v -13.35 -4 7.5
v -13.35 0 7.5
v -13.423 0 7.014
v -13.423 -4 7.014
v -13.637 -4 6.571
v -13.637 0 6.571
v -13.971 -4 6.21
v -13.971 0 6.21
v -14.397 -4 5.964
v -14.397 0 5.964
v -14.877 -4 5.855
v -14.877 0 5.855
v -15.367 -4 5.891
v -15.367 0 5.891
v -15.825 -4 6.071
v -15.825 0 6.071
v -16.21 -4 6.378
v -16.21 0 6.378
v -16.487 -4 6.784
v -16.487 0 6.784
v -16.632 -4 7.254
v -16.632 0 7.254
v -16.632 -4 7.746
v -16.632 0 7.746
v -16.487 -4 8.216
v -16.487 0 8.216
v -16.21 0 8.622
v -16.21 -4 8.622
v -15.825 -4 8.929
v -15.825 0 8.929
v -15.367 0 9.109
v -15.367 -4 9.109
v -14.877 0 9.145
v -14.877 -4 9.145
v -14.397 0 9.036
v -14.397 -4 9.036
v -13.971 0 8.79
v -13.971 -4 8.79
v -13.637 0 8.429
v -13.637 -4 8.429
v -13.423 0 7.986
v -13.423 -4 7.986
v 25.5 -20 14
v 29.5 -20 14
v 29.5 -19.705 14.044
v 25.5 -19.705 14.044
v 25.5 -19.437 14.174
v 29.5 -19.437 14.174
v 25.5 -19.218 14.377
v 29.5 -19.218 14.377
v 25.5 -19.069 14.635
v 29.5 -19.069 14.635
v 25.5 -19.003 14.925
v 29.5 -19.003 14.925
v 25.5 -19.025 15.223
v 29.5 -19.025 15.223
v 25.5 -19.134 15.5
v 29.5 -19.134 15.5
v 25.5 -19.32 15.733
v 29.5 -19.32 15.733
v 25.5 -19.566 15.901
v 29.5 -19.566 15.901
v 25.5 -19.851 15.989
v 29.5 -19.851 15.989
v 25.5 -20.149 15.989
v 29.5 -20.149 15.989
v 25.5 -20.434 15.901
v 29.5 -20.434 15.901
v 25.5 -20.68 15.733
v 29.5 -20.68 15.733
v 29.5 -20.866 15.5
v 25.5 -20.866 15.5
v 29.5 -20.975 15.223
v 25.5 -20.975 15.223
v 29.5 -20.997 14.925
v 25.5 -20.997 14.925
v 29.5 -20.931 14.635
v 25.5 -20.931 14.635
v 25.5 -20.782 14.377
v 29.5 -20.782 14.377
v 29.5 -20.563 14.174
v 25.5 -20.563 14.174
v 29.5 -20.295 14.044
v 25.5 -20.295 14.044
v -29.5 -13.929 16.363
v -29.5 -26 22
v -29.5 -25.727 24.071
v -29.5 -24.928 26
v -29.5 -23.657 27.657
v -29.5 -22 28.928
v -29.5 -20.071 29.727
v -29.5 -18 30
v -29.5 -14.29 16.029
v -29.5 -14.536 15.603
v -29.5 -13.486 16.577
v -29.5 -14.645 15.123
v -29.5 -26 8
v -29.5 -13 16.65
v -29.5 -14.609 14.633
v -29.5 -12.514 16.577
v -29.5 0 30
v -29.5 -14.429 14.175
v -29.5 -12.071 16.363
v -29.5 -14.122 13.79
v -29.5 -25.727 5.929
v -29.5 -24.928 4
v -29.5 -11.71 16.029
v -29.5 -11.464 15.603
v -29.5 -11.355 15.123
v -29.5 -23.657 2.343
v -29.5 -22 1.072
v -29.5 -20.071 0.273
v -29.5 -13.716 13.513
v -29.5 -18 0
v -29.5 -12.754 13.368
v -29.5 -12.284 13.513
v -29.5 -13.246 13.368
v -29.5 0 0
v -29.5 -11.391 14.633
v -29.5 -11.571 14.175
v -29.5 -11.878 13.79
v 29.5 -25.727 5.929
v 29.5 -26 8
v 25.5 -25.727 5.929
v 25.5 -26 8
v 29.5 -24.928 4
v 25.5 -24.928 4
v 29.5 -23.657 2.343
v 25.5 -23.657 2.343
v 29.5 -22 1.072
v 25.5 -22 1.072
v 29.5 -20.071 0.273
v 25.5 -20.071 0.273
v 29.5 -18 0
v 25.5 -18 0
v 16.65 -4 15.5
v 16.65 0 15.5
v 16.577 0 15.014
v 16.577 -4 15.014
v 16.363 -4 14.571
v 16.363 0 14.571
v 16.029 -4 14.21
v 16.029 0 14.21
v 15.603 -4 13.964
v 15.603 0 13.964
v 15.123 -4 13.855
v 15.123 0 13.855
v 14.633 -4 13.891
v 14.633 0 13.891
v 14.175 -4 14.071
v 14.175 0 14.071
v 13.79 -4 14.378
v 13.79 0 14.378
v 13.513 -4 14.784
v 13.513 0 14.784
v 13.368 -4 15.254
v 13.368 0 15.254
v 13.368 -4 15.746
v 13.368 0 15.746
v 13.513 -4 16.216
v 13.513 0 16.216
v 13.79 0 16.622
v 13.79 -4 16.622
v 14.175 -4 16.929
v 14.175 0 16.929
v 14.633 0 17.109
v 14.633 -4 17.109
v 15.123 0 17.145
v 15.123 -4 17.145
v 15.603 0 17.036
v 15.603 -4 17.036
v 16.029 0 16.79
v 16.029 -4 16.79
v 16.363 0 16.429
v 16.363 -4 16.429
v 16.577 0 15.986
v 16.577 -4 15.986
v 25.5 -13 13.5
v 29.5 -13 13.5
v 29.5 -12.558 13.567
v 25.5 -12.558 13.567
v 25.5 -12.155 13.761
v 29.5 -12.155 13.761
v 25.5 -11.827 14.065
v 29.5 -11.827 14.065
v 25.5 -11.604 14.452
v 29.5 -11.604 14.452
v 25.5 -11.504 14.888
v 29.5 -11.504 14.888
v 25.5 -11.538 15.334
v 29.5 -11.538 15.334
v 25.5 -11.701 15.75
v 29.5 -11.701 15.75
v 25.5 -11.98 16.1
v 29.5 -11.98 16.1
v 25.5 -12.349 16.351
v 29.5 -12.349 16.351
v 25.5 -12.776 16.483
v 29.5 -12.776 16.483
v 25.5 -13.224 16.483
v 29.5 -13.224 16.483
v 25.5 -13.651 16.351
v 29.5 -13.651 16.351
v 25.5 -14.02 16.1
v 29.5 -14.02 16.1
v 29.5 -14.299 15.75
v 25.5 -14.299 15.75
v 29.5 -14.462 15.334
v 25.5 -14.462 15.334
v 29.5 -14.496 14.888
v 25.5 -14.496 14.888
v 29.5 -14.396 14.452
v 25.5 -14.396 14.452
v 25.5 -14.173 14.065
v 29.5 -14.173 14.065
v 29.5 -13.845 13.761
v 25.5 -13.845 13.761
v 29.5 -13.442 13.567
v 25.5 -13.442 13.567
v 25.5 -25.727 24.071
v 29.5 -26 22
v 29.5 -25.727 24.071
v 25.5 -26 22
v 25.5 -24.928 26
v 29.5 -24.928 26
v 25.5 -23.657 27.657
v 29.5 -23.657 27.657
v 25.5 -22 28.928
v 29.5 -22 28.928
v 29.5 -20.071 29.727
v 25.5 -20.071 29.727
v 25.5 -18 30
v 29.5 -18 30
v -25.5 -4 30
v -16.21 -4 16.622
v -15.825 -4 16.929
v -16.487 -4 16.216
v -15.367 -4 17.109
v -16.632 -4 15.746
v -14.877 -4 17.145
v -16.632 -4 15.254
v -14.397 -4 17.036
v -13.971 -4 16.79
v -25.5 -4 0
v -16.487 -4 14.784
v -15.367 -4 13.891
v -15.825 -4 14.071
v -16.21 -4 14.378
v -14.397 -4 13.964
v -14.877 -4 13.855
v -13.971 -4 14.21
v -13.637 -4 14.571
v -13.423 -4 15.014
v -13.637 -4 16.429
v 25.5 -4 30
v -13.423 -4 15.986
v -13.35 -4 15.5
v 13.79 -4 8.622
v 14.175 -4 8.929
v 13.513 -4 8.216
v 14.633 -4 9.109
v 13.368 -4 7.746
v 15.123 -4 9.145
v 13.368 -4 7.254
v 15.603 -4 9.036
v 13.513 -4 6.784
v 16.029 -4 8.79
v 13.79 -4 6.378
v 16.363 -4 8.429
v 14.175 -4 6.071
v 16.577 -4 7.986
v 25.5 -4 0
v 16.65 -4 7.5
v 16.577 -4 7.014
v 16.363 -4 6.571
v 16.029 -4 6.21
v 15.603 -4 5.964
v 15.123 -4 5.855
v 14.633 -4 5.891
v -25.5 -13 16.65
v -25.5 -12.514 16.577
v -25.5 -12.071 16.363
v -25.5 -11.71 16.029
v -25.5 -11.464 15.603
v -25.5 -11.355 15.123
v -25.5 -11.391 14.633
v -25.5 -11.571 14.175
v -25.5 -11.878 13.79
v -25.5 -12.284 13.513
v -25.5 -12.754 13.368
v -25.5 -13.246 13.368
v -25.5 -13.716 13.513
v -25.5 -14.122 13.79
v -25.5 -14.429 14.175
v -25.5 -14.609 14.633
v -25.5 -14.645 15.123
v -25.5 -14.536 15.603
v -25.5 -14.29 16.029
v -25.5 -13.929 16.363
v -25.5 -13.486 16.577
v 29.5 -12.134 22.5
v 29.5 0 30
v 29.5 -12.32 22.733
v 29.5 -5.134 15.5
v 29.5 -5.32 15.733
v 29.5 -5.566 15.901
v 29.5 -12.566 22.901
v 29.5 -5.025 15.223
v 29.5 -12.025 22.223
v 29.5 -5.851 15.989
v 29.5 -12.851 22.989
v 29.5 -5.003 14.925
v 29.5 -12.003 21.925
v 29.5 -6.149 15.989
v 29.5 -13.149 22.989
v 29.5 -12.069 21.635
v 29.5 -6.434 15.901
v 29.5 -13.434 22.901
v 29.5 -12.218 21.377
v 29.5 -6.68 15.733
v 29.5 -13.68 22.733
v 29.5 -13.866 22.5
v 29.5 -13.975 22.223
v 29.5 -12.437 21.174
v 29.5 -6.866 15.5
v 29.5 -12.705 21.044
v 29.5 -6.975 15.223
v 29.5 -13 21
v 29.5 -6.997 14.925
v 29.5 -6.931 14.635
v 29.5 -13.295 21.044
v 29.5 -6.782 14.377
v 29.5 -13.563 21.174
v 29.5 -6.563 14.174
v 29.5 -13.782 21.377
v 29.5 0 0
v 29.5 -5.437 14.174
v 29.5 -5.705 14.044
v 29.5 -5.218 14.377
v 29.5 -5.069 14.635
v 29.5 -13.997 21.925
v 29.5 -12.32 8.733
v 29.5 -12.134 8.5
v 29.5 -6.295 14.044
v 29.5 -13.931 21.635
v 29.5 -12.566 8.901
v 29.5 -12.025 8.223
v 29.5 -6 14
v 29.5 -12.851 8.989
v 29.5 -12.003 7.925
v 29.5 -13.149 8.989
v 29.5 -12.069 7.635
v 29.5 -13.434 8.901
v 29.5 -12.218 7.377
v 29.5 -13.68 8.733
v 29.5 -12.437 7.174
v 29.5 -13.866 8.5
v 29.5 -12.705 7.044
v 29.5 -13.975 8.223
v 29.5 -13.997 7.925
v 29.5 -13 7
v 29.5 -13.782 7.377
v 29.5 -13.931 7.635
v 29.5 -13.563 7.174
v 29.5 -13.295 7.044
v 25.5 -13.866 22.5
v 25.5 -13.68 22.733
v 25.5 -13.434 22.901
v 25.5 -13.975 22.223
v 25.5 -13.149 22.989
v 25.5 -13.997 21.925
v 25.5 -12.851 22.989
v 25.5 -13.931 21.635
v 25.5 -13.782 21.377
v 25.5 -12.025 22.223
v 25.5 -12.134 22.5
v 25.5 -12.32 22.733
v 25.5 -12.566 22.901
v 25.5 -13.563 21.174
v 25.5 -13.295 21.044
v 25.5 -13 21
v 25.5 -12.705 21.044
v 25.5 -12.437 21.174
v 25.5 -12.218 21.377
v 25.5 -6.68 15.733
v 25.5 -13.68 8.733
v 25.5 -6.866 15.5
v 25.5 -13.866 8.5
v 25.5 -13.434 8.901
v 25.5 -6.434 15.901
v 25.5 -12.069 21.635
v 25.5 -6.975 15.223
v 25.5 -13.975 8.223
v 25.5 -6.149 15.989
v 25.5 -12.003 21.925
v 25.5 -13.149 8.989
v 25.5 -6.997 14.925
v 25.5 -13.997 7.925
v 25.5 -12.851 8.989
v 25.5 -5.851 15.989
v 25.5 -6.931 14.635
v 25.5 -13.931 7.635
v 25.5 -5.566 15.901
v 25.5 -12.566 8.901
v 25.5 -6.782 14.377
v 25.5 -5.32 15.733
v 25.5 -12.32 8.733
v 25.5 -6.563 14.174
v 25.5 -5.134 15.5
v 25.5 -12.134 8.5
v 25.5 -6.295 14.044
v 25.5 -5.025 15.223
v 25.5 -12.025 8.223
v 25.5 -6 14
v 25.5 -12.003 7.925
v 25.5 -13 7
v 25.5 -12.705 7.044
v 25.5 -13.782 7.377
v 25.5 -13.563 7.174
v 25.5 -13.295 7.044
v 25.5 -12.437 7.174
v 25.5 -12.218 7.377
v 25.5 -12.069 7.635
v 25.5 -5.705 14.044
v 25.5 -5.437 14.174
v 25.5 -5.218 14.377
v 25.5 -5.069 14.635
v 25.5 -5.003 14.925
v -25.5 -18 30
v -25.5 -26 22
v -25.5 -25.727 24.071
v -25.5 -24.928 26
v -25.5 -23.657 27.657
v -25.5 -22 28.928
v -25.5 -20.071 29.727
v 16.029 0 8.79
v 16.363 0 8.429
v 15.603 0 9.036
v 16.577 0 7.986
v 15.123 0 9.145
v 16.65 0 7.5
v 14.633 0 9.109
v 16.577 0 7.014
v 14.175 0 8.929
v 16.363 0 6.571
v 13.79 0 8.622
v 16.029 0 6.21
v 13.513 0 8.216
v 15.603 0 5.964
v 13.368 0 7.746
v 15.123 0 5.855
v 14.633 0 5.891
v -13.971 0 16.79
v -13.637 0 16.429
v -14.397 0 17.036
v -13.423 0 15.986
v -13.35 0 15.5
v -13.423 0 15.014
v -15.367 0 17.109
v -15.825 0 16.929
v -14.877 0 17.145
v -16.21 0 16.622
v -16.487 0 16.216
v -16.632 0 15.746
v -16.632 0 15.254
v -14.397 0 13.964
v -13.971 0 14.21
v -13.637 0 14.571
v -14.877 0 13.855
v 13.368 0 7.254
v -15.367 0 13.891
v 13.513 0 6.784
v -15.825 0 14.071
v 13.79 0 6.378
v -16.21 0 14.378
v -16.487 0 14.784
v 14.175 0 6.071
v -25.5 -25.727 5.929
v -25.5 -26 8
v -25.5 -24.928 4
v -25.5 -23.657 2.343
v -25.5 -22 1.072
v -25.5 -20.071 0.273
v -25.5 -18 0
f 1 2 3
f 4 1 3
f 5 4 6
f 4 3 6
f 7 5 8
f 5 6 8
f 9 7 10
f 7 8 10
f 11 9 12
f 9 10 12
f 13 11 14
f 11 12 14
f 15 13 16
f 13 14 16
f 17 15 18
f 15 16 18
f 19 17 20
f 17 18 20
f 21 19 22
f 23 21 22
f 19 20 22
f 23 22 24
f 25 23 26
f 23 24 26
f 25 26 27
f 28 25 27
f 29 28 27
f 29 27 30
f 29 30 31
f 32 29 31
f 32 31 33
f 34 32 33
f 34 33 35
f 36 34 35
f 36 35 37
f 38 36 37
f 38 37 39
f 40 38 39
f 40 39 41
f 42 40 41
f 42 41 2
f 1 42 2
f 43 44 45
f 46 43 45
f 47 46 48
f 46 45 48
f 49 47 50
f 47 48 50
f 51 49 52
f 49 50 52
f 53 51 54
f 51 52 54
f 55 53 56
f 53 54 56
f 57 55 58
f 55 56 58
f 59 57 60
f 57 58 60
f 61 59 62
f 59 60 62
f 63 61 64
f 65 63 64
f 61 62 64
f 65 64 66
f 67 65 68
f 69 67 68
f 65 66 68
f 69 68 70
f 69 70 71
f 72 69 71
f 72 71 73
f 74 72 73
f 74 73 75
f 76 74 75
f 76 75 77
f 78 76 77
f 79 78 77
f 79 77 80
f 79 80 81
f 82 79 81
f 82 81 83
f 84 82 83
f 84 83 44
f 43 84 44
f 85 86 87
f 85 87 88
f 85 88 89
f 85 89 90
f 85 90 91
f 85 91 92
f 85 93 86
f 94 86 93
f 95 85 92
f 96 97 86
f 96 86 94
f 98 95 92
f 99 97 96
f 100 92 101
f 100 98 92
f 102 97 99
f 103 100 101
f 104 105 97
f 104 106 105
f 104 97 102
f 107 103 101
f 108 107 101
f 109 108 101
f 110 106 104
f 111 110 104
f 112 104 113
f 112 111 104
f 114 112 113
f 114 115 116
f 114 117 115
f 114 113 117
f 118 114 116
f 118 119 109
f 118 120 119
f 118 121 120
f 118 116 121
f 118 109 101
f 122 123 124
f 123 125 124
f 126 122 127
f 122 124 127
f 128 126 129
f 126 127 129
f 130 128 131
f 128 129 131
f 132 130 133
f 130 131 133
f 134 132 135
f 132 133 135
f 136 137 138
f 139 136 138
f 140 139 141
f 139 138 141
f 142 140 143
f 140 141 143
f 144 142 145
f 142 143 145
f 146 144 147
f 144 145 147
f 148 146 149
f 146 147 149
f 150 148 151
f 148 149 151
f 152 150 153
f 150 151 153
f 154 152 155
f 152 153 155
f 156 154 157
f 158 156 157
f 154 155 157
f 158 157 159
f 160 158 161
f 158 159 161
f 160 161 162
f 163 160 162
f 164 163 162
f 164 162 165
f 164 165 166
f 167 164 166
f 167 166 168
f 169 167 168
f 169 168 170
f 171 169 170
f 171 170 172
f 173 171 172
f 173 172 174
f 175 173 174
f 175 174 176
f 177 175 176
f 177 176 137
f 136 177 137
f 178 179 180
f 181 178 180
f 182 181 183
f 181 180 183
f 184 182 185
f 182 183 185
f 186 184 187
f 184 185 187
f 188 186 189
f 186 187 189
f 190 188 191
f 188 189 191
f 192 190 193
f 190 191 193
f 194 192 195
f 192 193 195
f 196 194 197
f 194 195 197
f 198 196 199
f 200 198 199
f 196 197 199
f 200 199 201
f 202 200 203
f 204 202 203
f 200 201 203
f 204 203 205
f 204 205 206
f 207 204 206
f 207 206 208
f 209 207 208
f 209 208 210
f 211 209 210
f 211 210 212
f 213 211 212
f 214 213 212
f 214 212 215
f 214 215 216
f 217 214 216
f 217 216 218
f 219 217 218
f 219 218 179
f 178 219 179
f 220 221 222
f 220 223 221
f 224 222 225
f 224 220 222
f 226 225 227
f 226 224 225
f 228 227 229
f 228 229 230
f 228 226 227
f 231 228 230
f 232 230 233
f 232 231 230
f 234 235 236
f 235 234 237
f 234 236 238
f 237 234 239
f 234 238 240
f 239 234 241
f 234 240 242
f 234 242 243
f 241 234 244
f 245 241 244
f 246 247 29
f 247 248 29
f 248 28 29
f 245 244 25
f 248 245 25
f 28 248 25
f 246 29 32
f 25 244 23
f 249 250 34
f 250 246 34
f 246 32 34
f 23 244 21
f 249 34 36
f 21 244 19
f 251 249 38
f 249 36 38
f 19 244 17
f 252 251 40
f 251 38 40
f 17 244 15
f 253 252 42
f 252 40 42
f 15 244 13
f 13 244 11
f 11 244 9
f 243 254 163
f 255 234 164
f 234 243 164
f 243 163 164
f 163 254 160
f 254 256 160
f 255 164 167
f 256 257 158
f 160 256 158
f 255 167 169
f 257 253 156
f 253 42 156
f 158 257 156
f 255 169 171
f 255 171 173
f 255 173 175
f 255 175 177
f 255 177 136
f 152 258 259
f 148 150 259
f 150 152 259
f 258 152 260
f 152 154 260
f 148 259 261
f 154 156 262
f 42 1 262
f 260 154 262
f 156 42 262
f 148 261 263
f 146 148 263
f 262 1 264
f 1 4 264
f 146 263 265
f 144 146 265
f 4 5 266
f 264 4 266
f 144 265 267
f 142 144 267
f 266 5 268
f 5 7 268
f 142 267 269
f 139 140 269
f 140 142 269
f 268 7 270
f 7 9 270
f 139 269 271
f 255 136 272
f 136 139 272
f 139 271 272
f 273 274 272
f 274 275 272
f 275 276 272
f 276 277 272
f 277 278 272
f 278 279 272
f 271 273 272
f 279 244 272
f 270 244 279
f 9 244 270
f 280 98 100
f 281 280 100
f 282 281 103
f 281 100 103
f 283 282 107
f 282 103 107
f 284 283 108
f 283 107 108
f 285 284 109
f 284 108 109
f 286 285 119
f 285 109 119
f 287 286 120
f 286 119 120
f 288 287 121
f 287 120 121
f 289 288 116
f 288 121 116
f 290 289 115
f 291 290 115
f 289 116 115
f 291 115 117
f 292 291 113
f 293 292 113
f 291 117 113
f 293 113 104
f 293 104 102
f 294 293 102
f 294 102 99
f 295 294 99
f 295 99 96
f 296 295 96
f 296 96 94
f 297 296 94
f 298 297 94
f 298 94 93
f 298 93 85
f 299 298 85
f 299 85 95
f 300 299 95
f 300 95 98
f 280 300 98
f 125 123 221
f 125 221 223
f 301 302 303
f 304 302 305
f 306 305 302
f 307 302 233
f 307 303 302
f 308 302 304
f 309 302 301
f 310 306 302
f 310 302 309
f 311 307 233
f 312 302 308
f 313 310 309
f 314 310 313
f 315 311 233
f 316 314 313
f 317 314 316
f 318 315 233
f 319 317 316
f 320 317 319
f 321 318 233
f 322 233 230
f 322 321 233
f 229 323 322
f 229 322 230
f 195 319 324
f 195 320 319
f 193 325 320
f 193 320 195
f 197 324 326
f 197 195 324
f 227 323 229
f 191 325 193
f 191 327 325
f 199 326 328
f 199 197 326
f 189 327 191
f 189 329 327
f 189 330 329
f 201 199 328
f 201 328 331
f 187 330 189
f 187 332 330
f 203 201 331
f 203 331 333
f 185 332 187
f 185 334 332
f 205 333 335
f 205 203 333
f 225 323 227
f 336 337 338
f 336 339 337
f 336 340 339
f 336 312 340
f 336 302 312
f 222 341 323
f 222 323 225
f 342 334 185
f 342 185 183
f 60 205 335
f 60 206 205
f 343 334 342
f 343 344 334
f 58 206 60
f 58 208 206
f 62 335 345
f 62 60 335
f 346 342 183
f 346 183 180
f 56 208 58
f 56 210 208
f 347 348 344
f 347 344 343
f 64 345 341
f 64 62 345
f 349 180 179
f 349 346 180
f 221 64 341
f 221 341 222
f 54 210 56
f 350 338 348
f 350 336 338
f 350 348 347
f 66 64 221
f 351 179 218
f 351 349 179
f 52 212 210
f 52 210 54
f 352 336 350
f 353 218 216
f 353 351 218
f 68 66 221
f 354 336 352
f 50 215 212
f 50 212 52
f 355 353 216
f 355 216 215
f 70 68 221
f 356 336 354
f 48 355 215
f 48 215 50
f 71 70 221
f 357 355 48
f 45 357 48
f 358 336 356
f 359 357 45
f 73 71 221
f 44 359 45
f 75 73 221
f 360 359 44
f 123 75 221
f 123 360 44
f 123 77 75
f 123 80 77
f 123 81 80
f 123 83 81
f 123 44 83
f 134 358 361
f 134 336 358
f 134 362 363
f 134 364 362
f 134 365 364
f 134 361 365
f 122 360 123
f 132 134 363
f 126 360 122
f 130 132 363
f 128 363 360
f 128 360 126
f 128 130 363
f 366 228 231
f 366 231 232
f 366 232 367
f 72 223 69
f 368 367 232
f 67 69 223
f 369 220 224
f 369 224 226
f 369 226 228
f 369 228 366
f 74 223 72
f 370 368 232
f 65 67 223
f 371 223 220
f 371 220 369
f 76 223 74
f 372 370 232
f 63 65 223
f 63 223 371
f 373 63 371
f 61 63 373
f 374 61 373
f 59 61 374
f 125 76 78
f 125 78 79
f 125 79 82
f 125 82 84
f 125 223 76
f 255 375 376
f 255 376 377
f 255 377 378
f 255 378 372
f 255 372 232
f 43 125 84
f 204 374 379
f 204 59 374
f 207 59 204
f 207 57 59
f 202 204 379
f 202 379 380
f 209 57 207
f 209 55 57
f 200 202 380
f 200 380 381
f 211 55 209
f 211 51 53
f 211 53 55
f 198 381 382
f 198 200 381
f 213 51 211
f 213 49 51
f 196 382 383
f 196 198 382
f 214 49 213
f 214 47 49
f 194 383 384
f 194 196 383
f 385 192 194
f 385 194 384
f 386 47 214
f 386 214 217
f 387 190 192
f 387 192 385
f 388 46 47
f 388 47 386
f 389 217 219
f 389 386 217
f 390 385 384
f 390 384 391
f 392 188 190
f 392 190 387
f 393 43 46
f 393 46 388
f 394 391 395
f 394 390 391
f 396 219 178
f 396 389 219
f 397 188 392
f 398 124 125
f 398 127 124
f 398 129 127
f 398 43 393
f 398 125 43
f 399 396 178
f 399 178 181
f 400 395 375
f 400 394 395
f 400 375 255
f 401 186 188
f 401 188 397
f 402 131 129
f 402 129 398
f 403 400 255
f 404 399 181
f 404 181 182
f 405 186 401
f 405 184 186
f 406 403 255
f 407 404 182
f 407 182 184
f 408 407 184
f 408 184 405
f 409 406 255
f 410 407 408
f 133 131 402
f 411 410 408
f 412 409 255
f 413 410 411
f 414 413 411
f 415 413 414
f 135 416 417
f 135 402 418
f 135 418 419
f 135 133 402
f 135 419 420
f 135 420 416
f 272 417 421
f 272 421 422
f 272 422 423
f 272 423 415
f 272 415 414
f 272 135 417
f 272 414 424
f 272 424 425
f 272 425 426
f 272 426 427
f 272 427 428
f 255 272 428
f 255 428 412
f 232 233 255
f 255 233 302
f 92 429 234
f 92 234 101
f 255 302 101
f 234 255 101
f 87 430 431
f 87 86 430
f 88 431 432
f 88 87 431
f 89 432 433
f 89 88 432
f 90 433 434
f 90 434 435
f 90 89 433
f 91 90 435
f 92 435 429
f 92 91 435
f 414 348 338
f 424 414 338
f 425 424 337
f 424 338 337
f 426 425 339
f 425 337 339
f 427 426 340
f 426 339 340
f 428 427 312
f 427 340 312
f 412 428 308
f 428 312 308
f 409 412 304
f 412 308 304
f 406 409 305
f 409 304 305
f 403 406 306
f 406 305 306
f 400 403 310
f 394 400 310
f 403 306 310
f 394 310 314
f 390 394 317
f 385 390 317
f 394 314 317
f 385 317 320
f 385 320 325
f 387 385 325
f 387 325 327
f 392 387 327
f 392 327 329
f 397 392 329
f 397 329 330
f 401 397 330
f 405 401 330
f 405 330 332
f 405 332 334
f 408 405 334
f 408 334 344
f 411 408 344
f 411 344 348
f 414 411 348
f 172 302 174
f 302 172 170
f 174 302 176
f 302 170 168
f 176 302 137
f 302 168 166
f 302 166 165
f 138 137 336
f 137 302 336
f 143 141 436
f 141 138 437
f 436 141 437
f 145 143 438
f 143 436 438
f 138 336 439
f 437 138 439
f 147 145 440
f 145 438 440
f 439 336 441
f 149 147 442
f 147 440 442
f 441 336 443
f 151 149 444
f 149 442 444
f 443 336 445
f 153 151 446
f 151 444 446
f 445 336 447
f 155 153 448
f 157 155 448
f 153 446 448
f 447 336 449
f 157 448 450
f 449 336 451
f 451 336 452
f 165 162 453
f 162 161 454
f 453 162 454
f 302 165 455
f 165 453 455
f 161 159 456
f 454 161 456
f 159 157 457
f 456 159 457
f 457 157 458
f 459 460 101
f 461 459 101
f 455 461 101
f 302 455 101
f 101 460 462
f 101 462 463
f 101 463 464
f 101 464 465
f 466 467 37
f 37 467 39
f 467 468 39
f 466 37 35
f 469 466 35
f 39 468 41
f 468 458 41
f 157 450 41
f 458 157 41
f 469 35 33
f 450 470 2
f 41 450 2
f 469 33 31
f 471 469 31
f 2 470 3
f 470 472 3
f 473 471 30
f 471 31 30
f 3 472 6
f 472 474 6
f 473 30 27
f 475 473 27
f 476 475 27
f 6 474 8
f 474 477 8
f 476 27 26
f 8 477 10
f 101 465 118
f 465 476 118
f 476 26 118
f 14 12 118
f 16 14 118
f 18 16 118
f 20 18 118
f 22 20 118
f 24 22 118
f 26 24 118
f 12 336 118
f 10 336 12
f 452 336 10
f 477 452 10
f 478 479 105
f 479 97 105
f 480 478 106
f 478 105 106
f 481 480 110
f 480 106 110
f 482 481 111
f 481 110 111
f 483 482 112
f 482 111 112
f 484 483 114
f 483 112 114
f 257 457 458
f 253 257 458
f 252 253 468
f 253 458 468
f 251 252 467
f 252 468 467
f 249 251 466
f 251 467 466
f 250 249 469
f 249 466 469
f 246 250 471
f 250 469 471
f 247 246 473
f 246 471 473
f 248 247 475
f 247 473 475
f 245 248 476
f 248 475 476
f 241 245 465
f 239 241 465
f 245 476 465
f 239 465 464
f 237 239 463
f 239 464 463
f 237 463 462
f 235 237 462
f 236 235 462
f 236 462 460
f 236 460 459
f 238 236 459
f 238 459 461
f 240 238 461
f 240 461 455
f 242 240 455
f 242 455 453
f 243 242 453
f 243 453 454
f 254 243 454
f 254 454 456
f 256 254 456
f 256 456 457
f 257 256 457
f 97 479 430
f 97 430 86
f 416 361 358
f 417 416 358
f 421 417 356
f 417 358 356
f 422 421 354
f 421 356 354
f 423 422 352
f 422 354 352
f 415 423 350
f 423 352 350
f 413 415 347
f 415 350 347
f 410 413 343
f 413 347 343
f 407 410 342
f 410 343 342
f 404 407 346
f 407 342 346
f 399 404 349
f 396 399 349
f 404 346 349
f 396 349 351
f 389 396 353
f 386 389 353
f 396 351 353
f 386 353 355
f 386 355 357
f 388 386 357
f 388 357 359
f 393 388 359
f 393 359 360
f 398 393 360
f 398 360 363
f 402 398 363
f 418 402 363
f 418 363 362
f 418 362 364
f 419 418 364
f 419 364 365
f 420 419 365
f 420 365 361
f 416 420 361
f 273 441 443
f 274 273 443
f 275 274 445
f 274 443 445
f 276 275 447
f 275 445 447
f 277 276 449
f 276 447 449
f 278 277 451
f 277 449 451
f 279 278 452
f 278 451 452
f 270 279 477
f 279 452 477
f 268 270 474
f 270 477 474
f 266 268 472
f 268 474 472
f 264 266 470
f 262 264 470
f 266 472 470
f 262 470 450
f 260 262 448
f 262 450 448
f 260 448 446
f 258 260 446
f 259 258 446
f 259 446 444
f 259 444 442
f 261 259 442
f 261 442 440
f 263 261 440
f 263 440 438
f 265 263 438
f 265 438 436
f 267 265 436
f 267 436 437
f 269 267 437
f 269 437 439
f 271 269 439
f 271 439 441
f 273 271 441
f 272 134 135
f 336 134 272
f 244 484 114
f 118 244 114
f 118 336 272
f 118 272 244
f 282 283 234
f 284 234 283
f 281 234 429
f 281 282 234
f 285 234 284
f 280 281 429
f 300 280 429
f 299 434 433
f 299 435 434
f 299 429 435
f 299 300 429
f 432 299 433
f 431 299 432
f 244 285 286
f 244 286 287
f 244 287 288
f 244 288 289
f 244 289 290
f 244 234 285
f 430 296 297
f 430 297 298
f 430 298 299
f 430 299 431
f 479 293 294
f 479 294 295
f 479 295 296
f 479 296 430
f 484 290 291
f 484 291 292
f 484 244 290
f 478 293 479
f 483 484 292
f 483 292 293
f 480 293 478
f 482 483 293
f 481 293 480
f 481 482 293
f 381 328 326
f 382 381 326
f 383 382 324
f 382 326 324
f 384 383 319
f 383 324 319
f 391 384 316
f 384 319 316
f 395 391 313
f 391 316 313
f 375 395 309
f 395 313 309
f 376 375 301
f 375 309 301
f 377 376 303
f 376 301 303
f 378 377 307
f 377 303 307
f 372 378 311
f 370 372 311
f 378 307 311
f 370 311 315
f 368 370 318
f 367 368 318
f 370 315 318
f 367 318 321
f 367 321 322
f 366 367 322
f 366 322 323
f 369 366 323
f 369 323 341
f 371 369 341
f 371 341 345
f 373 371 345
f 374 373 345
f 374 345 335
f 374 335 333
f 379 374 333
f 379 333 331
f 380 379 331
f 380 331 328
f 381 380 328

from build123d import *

# Parameters (mm, degrees)
EXTRUDE_1_DEPTH     = 30
FILLET_1_R          = 8
SKETCH_4_R          = 1.65
CUT_EXTRUDE_1_DEPTH = 10
SKETCH_5_R          = 1.65
CUT_EXTRUDE_2_DEPTH = 10
SKETCH_6_R          = 1
CUT_EXTRUDE_3_DEPTH = 10
SKETCH_7_R          = 1.5
CUT_EXTRUDE_4_DEPTH = 10


with BuildPart() as part:
    # 草图1 → 凸台-拉伸1 (new body)
    with BuildSketch(Plane.XY):
        Polygon((0, 0), (29.5, 0), (29.5, -26), (25.5, -26), (25.5, -4), (0, -4), (-25.5, -4), (-25.5, -26), (-29.5, -26), (-29.5, 0), align=None)
    extrude(amount=EXTRUDE_1_DEPTH)

    # 圆角1
    fillet_1_edges = [part.edges().sort_by_distance(p)[0] for p in [
        (27.5, -26, 0),
        (-27.5, -26, 0),
        (-27.5, -26, 30),
        (27.5, -26, 30),
    ]]
    fillet(fillet_1_edges, radius=FILLET_1_R)

    # 草图4 → 切除-拉伸1 (cut)
    with BuildSketch(Plane(origin=(0, 0, 0), x_dir=(1, 0, 0), z_dir=(0, 1, 0))):
        with Locations((15, -7.5)):
            Circle(SKETCH_4_R)
        with Locations((-15, -7.5)):
            Circle(SKETCH_4_R)
        with Locations((-15, -15.5)):
            Circle(SKETCH_4_R)
        with Locations((15, -15.5)):
            Circle(SKETCH_4_R)
    extrude(amount=-CUT_EXTRUDE_1_DEPTH, mode=Mode.SUBTRACT)

    # 草图5 → 切除-拉伸2 (cut)
    with BuildSketch(Plane.ZY.offset(29.5)):
        with Locations((15, -13)):
            Circle(SKETCH_5_R)
    extrude(amount=-CUT_EXTRUDE_2_DEPTH, mode=Mode.SUBTRACT)

    # 草图6 → 切除-拉伸3 (cut)
    with BuildSketch(Plane(origin=(29.5, 0, 0), x_dir=(0, 0, -1), z_dir=(1, 0, 0))):
        with Locations((-15, -6)):
            Circle(SKETCH_6_R)
        with Locations((-8, -13)):
            Circle(SKETCH_6_R)
        with Locations((-15, -20)):
            Circle(SKETCH_6_R)
        with Locations((-22, -13)):
            Circle(SKETCH_6_R)
    extrude(amount=-CUT_EXTRUDE_3_DEPTH, mode=Mode.SUBTRACT)

    # 草图7 → 切除-拉伸4 (cut)
    with BuildSketch(Plane(origin=(29.5, 0, 0), x_dir=(0, 0, -1), z_dir=(1, 0, 0))):
        with Locations((-15, -13)):
            Circle(SKETCH_7_R)
    extrude(amount=-CUT_EXTRUDE_4_DEPTH, mode=Mode.SUBTRACT)


solid = part.part
